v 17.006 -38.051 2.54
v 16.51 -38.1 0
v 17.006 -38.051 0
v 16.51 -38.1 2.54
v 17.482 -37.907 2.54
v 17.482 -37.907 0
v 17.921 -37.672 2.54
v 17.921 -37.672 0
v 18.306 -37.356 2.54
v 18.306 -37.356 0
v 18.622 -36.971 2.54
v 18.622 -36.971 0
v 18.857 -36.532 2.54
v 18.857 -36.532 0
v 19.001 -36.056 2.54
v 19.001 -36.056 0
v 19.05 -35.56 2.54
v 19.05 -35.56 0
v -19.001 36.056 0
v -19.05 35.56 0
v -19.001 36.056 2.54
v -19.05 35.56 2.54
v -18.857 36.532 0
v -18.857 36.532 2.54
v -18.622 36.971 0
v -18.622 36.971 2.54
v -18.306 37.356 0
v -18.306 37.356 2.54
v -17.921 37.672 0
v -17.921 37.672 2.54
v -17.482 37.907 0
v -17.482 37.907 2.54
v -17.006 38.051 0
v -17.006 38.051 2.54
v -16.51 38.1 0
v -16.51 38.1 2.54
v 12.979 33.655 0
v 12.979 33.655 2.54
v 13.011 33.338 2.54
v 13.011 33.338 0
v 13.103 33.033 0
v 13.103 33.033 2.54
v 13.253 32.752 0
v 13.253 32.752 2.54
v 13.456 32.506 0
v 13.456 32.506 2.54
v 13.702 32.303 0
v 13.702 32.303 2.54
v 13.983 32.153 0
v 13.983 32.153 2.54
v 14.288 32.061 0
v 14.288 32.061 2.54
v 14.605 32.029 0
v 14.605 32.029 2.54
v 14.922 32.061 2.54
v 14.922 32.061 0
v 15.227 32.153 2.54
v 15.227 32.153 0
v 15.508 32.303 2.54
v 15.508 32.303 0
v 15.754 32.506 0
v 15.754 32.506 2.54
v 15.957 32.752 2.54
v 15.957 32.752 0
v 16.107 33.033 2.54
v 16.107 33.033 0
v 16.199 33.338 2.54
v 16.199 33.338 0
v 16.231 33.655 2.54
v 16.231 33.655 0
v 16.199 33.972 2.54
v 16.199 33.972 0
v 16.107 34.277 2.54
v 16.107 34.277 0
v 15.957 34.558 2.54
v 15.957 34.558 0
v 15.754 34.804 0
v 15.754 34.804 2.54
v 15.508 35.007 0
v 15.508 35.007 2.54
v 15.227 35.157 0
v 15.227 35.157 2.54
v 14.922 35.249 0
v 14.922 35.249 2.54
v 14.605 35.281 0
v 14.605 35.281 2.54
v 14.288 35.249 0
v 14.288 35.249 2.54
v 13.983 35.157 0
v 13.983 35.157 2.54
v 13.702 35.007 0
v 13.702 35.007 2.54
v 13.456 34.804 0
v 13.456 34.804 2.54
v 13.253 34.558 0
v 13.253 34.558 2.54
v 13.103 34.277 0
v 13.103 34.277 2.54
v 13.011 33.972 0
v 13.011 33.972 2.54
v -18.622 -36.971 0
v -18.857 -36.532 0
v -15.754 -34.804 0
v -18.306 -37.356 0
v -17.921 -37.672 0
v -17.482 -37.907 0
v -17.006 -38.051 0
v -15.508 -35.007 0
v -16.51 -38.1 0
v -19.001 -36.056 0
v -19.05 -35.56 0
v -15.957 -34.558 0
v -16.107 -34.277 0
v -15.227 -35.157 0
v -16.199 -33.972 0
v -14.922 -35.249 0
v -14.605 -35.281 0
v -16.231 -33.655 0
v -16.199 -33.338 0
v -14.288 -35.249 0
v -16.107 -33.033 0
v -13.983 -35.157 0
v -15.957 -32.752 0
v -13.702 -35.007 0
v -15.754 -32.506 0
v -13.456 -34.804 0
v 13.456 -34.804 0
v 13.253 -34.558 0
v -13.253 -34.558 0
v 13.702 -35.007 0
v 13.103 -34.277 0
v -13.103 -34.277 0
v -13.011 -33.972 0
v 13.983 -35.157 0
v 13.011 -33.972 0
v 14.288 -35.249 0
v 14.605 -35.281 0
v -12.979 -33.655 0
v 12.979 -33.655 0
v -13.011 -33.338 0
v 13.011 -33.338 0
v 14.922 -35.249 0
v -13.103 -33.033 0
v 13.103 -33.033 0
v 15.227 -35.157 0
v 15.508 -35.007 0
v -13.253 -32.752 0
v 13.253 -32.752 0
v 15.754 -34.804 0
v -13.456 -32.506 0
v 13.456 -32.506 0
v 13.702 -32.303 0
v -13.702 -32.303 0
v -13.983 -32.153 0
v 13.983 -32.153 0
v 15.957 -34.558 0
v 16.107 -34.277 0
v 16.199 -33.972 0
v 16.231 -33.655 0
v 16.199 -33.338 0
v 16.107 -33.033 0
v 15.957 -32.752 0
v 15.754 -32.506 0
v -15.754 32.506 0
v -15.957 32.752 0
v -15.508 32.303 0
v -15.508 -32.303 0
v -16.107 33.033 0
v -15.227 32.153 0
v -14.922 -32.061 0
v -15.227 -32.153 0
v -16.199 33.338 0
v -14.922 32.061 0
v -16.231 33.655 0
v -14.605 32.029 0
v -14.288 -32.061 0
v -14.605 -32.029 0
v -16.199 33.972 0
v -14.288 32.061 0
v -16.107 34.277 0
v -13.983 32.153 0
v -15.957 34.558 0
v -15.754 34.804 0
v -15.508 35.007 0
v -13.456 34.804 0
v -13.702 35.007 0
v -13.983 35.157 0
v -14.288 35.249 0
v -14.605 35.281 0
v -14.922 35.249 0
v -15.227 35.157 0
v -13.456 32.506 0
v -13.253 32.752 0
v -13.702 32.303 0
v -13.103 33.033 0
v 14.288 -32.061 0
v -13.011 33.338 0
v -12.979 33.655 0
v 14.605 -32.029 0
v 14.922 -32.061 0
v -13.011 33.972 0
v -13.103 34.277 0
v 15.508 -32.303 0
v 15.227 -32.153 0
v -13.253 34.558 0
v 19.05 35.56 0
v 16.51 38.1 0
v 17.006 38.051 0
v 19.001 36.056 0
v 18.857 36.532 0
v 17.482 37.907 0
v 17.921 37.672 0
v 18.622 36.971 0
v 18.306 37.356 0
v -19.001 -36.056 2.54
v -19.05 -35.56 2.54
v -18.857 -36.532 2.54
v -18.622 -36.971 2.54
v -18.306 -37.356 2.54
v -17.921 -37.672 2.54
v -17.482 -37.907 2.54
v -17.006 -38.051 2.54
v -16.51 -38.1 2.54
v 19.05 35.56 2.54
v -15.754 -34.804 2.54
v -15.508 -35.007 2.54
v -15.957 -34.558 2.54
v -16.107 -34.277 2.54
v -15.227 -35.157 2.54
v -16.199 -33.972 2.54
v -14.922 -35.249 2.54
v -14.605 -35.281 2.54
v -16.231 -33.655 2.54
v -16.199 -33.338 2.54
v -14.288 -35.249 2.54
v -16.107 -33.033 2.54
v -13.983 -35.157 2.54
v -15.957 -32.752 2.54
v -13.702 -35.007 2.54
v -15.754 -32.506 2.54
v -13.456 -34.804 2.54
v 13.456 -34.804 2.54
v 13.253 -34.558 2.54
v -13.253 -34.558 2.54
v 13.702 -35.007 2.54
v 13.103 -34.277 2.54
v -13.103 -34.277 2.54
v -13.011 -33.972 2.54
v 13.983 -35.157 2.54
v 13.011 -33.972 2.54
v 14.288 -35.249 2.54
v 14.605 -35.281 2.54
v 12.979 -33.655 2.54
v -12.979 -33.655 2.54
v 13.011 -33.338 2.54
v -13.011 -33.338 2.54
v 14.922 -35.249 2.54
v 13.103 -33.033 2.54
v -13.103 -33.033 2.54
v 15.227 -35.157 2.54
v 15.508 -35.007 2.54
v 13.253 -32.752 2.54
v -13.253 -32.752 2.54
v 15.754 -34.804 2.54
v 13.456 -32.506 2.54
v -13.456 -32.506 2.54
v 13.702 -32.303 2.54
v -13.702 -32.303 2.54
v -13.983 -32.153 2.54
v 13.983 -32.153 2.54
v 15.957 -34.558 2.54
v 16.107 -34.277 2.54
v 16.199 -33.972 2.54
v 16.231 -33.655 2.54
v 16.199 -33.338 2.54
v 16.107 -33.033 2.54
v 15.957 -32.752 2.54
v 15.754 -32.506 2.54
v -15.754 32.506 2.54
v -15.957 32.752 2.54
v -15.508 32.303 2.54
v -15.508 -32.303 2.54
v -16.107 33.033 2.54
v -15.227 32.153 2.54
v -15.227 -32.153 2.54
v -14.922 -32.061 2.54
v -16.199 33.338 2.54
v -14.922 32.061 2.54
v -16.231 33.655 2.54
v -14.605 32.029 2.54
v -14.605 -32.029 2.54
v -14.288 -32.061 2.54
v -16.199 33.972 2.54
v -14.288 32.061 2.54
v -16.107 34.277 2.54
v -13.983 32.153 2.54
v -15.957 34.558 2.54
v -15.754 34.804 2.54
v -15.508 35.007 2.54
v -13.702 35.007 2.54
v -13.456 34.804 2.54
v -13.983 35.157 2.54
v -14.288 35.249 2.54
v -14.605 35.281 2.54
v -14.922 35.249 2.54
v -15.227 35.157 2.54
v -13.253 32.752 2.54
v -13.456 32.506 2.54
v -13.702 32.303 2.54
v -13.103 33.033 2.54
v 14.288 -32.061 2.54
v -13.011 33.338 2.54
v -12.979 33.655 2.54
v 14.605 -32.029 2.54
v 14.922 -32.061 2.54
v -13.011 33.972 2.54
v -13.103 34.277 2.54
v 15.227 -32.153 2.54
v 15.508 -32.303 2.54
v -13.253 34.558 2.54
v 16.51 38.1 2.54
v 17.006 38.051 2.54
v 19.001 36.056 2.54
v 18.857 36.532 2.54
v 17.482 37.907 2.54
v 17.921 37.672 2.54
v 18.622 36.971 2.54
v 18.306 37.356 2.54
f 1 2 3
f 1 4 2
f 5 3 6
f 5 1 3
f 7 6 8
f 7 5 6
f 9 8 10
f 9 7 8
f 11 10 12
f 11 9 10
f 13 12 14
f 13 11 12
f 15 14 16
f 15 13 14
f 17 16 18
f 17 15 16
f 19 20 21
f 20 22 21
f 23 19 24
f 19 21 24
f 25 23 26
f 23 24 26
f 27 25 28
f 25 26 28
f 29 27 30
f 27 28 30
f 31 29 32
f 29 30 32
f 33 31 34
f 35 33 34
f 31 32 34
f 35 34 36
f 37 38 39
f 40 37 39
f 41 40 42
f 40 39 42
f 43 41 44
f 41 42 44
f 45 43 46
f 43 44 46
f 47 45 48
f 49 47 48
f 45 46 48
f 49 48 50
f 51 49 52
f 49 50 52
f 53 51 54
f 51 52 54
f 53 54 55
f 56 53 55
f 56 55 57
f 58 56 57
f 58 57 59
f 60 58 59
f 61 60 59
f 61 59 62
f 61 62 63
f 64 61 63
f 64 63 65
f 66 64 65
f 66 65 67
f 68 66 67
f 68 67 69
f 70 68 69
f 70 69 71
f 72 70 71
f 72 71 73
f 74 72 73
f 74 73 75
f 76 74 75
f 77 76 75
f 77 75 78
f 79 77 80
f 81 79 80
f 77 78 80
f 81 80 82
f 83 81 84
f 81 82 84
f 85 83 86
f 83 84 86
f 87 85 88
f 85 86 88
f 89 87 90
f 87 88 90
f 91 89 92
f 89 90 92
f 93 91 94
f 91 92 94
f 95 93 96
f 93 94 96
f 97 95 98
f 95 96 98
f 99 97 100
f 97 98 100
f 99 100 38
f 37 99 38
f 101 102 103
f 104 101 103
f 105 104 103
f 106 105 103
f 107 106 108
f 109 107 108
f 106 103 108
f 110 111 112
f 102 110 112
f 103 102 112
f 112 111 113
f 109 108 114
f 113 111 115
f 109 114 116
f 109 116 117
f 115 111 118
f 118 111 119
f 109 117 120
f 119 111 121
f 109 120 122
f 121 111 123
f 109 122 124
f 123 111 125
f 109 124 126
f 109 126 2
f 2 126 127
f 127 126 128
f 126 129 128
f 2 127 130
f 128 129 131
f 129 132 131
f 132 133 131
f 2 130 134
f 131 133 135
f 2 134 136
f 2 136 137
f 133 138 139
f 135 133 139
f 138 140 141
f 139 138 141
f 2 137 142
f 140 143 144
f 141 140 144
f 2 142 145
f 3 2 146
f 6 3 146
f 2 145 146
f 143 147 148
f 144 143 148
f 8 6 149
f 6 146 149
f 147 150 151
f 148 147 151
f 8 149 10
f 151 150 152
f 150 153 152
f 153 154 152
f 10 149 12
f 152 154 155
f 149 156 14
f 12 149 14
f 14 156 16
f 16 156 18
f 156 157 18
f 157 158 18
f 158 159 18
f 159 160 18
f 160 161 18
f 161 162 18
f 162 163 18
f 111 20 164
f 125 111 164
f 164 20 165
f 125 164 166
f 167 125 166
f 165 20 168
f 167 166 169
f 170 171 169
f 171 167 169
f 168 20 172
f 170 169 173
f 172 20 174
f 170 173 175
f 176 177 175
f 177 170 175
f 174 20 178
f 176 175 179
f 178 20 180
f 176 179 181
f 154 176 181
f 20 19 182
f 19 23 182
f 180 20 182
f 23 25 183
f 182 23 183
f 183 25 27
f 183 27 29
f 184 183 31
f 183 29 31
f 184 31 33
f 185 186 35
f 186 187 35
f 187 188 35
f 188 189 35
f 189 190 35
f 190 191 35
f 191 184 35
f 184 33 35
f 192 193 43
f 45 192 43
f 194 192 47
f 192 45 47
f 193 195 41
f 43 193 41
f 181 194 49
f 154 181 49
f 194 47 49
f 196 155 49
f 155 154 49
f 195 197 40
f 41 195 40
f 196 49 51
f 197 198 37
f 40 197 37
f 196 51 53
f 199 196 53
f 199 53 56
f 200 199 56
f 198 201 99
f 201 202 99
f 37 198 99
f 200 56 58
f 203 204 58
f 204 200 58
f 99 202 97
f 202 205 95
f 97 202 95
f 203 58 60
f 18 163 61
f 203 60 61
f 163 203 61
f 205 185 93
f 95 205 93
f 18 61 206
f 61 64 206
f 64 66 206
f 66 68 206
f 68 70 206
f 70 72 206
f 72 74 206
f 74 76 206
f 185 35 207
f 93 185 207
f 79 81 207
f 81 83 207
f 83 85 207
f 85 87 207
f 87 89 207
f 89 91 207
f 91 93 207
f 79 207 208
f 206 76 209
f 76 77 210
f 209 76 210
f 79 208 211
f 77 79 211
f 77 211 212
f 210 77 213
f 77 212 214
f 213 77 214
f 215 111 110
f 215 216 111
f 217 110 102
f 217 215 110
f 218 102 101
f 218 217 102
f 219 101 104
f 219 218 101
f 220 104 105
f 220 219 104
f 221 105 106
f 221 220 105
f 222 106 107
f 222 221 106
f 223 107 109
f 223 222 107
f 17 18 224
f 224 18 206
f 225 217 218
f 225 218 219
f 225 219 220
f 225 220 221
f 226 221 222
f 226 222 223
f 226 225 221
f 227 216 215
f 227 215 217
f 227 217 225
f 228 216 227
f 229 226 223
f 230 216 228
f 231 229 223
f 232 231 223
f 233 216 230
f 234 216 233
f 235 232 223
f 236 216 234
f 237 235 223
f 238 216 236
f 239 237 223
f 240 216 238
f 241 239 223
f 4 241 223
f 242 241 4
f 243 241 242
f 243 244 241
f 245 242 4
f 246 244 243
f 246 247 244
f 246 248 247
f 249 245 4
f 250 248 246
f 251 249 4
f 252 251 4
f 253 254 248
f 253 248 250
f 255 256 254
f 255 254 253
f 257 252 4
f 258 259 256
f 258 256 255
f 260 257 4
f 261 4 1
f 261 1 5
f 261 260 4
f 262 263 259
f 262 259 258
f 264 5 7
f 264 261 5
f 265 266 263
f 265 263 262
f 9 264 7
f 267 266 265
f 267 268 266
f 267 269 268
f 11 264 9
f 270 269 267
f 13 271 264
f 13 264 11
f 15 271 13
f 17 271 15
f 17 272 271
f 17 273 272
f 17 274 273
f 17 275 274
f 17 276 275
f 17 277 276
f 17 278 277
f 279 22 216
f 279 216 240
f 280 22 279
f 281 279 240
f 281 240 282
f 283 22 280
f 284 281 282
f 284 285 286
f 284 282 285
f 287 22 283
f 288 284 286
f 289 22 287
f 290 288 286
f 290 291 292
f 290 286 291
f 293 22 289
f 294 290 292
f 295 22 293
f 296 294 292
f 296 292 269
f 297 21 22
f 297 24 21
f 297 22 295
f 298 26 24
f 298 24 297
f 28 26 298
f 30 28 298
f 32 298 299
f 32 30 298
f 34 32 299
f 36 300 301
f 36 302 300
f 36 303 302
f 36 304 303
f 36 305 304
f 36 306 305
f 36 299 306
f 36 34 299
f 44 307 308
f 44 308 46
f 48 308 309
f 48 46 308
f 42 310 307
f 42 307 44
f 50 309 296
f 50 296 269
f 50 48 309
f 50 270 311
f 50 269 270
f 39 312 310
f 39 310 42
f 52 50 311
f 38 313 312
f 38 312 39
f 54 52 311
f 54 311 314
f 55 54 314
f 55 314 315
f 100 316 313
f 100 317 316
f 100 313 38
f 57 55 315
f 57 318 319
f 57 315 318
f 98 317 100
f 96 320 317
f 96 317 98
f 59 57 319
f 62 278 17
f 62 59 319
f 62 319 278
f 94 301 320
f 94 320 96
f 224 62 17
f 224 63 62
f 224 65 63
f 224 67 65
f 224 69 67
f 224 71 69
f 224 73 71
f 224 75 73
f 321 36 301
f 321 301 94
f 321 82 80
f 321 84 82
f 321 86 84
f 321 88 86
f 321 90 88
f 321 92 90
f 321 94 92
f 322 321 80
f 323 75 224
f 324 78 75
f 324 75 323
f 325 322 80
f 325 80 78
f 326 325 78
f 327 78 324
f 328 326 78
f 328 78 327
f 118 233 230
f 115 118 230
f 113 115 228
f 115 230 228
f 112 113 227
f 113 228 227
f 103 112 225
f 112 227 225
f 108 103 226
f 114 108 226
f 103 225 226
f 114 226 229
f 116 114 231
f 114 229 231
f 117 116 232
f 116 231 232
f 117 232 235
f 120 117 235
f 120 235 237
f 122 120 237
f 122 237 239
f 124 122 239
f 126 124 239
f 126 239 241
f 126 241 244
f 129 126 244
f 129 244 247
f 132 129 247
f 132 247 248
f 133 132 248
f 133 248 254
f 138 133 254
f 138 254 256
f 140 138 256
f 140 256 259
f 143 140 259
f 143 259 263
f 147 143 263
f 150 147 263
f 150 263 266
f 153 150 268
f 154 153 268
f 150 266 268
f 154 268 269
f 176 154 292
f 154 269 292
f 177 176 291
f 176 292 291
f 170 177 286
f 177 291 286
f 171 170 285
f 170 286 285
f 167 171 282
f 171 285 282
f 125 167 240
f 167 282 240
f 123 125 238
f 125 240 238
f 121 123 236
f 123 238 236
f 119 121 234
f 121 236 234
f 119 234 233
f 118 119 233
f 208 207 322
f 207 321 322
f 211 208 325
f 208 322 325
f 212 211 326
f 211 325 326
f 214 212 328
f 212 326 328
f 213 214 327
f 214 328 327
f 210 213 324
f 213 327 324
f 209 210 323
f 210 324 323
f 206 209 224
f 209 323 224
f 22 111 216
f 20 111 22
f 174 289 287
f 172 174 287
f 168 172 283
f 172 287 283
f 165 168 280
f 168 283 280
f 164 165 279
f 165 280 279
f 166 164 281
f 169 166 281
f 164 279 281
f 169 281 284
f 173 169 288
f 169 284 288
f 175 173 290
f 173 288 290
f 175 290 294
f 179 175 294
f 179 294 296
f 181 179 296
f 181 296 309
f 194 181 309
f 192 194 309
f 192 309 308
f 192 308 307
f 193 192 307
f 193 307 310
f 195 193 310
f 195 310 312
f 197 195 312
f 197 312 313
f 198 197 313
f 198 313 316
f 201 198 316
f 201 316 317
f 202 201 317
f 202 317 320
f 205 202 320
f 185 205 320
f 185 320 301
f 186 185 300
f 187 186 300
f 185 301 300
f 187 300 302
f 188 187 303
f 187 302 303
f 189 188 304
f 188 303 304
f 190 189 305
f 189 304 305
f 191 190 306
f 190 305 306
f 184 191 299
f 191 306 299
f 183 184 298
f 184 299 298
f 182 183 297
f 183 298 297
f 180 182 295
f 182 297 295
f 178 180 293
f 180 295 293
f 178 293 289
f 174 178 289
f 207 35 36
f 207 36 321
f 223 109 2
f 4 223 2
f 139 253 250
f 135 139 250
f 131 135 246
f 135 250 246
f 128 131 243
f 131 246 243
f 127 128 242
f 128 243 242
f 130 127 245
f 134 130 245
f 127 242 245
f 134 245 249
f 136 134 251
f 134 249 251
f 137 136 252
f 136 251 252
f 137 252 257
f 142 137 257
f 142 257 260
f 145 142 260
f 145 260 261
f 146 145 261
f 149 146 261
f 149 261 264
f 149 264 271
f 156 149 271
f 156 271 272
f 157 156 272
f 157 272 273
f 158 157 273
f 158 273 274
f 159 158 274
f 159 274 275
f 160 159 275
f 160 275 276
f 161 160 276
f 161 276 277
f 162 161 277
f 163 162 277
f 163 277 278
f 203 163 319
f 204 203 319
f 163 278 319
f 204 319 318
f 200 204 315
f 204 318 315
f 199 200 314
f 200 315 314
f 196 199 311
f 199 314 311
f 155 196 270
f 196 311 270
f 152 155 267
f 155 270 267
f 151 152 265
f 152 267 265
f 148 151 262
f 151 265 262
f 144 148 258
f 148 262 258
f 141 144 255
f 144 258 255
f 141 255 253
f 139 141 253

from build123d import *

# Parameters (mm, degrees)
F0_W     = 38.1
F0_H     = 76.2
F1_DEPTH = 2.54
F2_D     = 3.2512
F2_DEPTH = 14.605
F2_TIP   = 0.9767590223
F3_R     = 2.54


with BuildPart() as f1:
    # F0 (on Top) → F1 (new body)
    with BuildSketch(Plane.XY):
        Rectangle(F0_W, F0_H)
    extrude(amount=F1_DEPTH)

    # F2
    with Locations(Plane(origin=(0, 0, 0), x_dir=(1, 0, 0), z_dir=(0, 0, -1))):
        with Locations((-14.605, -33.655), (14.605, -33.655), (14.605, 33.655), (-14.605, 33.655)):
            Hole(F2_D / 2, depth=F2_DEPTH)
            with Locations((0, 0, -(F2_DEPTH + F2_TIP / 2))):  # 118° drill point
                Cone(0, F2_D / 2, F2_TIP, mode=Mode.SUBTRACT)

    # F3
    f3_edges = [f1.edges().sort_by_distance(p)[0] for p in [
        (-19.05, 38.1, 1.27),
        (-19.05, -38.1, 1.27),
        (19.05, 38.1, 1.27),
        (19.05, -38.1, 1.27),
    ]]
    fillet(f3_edges, radius=F3_R)


solid = f1.part
